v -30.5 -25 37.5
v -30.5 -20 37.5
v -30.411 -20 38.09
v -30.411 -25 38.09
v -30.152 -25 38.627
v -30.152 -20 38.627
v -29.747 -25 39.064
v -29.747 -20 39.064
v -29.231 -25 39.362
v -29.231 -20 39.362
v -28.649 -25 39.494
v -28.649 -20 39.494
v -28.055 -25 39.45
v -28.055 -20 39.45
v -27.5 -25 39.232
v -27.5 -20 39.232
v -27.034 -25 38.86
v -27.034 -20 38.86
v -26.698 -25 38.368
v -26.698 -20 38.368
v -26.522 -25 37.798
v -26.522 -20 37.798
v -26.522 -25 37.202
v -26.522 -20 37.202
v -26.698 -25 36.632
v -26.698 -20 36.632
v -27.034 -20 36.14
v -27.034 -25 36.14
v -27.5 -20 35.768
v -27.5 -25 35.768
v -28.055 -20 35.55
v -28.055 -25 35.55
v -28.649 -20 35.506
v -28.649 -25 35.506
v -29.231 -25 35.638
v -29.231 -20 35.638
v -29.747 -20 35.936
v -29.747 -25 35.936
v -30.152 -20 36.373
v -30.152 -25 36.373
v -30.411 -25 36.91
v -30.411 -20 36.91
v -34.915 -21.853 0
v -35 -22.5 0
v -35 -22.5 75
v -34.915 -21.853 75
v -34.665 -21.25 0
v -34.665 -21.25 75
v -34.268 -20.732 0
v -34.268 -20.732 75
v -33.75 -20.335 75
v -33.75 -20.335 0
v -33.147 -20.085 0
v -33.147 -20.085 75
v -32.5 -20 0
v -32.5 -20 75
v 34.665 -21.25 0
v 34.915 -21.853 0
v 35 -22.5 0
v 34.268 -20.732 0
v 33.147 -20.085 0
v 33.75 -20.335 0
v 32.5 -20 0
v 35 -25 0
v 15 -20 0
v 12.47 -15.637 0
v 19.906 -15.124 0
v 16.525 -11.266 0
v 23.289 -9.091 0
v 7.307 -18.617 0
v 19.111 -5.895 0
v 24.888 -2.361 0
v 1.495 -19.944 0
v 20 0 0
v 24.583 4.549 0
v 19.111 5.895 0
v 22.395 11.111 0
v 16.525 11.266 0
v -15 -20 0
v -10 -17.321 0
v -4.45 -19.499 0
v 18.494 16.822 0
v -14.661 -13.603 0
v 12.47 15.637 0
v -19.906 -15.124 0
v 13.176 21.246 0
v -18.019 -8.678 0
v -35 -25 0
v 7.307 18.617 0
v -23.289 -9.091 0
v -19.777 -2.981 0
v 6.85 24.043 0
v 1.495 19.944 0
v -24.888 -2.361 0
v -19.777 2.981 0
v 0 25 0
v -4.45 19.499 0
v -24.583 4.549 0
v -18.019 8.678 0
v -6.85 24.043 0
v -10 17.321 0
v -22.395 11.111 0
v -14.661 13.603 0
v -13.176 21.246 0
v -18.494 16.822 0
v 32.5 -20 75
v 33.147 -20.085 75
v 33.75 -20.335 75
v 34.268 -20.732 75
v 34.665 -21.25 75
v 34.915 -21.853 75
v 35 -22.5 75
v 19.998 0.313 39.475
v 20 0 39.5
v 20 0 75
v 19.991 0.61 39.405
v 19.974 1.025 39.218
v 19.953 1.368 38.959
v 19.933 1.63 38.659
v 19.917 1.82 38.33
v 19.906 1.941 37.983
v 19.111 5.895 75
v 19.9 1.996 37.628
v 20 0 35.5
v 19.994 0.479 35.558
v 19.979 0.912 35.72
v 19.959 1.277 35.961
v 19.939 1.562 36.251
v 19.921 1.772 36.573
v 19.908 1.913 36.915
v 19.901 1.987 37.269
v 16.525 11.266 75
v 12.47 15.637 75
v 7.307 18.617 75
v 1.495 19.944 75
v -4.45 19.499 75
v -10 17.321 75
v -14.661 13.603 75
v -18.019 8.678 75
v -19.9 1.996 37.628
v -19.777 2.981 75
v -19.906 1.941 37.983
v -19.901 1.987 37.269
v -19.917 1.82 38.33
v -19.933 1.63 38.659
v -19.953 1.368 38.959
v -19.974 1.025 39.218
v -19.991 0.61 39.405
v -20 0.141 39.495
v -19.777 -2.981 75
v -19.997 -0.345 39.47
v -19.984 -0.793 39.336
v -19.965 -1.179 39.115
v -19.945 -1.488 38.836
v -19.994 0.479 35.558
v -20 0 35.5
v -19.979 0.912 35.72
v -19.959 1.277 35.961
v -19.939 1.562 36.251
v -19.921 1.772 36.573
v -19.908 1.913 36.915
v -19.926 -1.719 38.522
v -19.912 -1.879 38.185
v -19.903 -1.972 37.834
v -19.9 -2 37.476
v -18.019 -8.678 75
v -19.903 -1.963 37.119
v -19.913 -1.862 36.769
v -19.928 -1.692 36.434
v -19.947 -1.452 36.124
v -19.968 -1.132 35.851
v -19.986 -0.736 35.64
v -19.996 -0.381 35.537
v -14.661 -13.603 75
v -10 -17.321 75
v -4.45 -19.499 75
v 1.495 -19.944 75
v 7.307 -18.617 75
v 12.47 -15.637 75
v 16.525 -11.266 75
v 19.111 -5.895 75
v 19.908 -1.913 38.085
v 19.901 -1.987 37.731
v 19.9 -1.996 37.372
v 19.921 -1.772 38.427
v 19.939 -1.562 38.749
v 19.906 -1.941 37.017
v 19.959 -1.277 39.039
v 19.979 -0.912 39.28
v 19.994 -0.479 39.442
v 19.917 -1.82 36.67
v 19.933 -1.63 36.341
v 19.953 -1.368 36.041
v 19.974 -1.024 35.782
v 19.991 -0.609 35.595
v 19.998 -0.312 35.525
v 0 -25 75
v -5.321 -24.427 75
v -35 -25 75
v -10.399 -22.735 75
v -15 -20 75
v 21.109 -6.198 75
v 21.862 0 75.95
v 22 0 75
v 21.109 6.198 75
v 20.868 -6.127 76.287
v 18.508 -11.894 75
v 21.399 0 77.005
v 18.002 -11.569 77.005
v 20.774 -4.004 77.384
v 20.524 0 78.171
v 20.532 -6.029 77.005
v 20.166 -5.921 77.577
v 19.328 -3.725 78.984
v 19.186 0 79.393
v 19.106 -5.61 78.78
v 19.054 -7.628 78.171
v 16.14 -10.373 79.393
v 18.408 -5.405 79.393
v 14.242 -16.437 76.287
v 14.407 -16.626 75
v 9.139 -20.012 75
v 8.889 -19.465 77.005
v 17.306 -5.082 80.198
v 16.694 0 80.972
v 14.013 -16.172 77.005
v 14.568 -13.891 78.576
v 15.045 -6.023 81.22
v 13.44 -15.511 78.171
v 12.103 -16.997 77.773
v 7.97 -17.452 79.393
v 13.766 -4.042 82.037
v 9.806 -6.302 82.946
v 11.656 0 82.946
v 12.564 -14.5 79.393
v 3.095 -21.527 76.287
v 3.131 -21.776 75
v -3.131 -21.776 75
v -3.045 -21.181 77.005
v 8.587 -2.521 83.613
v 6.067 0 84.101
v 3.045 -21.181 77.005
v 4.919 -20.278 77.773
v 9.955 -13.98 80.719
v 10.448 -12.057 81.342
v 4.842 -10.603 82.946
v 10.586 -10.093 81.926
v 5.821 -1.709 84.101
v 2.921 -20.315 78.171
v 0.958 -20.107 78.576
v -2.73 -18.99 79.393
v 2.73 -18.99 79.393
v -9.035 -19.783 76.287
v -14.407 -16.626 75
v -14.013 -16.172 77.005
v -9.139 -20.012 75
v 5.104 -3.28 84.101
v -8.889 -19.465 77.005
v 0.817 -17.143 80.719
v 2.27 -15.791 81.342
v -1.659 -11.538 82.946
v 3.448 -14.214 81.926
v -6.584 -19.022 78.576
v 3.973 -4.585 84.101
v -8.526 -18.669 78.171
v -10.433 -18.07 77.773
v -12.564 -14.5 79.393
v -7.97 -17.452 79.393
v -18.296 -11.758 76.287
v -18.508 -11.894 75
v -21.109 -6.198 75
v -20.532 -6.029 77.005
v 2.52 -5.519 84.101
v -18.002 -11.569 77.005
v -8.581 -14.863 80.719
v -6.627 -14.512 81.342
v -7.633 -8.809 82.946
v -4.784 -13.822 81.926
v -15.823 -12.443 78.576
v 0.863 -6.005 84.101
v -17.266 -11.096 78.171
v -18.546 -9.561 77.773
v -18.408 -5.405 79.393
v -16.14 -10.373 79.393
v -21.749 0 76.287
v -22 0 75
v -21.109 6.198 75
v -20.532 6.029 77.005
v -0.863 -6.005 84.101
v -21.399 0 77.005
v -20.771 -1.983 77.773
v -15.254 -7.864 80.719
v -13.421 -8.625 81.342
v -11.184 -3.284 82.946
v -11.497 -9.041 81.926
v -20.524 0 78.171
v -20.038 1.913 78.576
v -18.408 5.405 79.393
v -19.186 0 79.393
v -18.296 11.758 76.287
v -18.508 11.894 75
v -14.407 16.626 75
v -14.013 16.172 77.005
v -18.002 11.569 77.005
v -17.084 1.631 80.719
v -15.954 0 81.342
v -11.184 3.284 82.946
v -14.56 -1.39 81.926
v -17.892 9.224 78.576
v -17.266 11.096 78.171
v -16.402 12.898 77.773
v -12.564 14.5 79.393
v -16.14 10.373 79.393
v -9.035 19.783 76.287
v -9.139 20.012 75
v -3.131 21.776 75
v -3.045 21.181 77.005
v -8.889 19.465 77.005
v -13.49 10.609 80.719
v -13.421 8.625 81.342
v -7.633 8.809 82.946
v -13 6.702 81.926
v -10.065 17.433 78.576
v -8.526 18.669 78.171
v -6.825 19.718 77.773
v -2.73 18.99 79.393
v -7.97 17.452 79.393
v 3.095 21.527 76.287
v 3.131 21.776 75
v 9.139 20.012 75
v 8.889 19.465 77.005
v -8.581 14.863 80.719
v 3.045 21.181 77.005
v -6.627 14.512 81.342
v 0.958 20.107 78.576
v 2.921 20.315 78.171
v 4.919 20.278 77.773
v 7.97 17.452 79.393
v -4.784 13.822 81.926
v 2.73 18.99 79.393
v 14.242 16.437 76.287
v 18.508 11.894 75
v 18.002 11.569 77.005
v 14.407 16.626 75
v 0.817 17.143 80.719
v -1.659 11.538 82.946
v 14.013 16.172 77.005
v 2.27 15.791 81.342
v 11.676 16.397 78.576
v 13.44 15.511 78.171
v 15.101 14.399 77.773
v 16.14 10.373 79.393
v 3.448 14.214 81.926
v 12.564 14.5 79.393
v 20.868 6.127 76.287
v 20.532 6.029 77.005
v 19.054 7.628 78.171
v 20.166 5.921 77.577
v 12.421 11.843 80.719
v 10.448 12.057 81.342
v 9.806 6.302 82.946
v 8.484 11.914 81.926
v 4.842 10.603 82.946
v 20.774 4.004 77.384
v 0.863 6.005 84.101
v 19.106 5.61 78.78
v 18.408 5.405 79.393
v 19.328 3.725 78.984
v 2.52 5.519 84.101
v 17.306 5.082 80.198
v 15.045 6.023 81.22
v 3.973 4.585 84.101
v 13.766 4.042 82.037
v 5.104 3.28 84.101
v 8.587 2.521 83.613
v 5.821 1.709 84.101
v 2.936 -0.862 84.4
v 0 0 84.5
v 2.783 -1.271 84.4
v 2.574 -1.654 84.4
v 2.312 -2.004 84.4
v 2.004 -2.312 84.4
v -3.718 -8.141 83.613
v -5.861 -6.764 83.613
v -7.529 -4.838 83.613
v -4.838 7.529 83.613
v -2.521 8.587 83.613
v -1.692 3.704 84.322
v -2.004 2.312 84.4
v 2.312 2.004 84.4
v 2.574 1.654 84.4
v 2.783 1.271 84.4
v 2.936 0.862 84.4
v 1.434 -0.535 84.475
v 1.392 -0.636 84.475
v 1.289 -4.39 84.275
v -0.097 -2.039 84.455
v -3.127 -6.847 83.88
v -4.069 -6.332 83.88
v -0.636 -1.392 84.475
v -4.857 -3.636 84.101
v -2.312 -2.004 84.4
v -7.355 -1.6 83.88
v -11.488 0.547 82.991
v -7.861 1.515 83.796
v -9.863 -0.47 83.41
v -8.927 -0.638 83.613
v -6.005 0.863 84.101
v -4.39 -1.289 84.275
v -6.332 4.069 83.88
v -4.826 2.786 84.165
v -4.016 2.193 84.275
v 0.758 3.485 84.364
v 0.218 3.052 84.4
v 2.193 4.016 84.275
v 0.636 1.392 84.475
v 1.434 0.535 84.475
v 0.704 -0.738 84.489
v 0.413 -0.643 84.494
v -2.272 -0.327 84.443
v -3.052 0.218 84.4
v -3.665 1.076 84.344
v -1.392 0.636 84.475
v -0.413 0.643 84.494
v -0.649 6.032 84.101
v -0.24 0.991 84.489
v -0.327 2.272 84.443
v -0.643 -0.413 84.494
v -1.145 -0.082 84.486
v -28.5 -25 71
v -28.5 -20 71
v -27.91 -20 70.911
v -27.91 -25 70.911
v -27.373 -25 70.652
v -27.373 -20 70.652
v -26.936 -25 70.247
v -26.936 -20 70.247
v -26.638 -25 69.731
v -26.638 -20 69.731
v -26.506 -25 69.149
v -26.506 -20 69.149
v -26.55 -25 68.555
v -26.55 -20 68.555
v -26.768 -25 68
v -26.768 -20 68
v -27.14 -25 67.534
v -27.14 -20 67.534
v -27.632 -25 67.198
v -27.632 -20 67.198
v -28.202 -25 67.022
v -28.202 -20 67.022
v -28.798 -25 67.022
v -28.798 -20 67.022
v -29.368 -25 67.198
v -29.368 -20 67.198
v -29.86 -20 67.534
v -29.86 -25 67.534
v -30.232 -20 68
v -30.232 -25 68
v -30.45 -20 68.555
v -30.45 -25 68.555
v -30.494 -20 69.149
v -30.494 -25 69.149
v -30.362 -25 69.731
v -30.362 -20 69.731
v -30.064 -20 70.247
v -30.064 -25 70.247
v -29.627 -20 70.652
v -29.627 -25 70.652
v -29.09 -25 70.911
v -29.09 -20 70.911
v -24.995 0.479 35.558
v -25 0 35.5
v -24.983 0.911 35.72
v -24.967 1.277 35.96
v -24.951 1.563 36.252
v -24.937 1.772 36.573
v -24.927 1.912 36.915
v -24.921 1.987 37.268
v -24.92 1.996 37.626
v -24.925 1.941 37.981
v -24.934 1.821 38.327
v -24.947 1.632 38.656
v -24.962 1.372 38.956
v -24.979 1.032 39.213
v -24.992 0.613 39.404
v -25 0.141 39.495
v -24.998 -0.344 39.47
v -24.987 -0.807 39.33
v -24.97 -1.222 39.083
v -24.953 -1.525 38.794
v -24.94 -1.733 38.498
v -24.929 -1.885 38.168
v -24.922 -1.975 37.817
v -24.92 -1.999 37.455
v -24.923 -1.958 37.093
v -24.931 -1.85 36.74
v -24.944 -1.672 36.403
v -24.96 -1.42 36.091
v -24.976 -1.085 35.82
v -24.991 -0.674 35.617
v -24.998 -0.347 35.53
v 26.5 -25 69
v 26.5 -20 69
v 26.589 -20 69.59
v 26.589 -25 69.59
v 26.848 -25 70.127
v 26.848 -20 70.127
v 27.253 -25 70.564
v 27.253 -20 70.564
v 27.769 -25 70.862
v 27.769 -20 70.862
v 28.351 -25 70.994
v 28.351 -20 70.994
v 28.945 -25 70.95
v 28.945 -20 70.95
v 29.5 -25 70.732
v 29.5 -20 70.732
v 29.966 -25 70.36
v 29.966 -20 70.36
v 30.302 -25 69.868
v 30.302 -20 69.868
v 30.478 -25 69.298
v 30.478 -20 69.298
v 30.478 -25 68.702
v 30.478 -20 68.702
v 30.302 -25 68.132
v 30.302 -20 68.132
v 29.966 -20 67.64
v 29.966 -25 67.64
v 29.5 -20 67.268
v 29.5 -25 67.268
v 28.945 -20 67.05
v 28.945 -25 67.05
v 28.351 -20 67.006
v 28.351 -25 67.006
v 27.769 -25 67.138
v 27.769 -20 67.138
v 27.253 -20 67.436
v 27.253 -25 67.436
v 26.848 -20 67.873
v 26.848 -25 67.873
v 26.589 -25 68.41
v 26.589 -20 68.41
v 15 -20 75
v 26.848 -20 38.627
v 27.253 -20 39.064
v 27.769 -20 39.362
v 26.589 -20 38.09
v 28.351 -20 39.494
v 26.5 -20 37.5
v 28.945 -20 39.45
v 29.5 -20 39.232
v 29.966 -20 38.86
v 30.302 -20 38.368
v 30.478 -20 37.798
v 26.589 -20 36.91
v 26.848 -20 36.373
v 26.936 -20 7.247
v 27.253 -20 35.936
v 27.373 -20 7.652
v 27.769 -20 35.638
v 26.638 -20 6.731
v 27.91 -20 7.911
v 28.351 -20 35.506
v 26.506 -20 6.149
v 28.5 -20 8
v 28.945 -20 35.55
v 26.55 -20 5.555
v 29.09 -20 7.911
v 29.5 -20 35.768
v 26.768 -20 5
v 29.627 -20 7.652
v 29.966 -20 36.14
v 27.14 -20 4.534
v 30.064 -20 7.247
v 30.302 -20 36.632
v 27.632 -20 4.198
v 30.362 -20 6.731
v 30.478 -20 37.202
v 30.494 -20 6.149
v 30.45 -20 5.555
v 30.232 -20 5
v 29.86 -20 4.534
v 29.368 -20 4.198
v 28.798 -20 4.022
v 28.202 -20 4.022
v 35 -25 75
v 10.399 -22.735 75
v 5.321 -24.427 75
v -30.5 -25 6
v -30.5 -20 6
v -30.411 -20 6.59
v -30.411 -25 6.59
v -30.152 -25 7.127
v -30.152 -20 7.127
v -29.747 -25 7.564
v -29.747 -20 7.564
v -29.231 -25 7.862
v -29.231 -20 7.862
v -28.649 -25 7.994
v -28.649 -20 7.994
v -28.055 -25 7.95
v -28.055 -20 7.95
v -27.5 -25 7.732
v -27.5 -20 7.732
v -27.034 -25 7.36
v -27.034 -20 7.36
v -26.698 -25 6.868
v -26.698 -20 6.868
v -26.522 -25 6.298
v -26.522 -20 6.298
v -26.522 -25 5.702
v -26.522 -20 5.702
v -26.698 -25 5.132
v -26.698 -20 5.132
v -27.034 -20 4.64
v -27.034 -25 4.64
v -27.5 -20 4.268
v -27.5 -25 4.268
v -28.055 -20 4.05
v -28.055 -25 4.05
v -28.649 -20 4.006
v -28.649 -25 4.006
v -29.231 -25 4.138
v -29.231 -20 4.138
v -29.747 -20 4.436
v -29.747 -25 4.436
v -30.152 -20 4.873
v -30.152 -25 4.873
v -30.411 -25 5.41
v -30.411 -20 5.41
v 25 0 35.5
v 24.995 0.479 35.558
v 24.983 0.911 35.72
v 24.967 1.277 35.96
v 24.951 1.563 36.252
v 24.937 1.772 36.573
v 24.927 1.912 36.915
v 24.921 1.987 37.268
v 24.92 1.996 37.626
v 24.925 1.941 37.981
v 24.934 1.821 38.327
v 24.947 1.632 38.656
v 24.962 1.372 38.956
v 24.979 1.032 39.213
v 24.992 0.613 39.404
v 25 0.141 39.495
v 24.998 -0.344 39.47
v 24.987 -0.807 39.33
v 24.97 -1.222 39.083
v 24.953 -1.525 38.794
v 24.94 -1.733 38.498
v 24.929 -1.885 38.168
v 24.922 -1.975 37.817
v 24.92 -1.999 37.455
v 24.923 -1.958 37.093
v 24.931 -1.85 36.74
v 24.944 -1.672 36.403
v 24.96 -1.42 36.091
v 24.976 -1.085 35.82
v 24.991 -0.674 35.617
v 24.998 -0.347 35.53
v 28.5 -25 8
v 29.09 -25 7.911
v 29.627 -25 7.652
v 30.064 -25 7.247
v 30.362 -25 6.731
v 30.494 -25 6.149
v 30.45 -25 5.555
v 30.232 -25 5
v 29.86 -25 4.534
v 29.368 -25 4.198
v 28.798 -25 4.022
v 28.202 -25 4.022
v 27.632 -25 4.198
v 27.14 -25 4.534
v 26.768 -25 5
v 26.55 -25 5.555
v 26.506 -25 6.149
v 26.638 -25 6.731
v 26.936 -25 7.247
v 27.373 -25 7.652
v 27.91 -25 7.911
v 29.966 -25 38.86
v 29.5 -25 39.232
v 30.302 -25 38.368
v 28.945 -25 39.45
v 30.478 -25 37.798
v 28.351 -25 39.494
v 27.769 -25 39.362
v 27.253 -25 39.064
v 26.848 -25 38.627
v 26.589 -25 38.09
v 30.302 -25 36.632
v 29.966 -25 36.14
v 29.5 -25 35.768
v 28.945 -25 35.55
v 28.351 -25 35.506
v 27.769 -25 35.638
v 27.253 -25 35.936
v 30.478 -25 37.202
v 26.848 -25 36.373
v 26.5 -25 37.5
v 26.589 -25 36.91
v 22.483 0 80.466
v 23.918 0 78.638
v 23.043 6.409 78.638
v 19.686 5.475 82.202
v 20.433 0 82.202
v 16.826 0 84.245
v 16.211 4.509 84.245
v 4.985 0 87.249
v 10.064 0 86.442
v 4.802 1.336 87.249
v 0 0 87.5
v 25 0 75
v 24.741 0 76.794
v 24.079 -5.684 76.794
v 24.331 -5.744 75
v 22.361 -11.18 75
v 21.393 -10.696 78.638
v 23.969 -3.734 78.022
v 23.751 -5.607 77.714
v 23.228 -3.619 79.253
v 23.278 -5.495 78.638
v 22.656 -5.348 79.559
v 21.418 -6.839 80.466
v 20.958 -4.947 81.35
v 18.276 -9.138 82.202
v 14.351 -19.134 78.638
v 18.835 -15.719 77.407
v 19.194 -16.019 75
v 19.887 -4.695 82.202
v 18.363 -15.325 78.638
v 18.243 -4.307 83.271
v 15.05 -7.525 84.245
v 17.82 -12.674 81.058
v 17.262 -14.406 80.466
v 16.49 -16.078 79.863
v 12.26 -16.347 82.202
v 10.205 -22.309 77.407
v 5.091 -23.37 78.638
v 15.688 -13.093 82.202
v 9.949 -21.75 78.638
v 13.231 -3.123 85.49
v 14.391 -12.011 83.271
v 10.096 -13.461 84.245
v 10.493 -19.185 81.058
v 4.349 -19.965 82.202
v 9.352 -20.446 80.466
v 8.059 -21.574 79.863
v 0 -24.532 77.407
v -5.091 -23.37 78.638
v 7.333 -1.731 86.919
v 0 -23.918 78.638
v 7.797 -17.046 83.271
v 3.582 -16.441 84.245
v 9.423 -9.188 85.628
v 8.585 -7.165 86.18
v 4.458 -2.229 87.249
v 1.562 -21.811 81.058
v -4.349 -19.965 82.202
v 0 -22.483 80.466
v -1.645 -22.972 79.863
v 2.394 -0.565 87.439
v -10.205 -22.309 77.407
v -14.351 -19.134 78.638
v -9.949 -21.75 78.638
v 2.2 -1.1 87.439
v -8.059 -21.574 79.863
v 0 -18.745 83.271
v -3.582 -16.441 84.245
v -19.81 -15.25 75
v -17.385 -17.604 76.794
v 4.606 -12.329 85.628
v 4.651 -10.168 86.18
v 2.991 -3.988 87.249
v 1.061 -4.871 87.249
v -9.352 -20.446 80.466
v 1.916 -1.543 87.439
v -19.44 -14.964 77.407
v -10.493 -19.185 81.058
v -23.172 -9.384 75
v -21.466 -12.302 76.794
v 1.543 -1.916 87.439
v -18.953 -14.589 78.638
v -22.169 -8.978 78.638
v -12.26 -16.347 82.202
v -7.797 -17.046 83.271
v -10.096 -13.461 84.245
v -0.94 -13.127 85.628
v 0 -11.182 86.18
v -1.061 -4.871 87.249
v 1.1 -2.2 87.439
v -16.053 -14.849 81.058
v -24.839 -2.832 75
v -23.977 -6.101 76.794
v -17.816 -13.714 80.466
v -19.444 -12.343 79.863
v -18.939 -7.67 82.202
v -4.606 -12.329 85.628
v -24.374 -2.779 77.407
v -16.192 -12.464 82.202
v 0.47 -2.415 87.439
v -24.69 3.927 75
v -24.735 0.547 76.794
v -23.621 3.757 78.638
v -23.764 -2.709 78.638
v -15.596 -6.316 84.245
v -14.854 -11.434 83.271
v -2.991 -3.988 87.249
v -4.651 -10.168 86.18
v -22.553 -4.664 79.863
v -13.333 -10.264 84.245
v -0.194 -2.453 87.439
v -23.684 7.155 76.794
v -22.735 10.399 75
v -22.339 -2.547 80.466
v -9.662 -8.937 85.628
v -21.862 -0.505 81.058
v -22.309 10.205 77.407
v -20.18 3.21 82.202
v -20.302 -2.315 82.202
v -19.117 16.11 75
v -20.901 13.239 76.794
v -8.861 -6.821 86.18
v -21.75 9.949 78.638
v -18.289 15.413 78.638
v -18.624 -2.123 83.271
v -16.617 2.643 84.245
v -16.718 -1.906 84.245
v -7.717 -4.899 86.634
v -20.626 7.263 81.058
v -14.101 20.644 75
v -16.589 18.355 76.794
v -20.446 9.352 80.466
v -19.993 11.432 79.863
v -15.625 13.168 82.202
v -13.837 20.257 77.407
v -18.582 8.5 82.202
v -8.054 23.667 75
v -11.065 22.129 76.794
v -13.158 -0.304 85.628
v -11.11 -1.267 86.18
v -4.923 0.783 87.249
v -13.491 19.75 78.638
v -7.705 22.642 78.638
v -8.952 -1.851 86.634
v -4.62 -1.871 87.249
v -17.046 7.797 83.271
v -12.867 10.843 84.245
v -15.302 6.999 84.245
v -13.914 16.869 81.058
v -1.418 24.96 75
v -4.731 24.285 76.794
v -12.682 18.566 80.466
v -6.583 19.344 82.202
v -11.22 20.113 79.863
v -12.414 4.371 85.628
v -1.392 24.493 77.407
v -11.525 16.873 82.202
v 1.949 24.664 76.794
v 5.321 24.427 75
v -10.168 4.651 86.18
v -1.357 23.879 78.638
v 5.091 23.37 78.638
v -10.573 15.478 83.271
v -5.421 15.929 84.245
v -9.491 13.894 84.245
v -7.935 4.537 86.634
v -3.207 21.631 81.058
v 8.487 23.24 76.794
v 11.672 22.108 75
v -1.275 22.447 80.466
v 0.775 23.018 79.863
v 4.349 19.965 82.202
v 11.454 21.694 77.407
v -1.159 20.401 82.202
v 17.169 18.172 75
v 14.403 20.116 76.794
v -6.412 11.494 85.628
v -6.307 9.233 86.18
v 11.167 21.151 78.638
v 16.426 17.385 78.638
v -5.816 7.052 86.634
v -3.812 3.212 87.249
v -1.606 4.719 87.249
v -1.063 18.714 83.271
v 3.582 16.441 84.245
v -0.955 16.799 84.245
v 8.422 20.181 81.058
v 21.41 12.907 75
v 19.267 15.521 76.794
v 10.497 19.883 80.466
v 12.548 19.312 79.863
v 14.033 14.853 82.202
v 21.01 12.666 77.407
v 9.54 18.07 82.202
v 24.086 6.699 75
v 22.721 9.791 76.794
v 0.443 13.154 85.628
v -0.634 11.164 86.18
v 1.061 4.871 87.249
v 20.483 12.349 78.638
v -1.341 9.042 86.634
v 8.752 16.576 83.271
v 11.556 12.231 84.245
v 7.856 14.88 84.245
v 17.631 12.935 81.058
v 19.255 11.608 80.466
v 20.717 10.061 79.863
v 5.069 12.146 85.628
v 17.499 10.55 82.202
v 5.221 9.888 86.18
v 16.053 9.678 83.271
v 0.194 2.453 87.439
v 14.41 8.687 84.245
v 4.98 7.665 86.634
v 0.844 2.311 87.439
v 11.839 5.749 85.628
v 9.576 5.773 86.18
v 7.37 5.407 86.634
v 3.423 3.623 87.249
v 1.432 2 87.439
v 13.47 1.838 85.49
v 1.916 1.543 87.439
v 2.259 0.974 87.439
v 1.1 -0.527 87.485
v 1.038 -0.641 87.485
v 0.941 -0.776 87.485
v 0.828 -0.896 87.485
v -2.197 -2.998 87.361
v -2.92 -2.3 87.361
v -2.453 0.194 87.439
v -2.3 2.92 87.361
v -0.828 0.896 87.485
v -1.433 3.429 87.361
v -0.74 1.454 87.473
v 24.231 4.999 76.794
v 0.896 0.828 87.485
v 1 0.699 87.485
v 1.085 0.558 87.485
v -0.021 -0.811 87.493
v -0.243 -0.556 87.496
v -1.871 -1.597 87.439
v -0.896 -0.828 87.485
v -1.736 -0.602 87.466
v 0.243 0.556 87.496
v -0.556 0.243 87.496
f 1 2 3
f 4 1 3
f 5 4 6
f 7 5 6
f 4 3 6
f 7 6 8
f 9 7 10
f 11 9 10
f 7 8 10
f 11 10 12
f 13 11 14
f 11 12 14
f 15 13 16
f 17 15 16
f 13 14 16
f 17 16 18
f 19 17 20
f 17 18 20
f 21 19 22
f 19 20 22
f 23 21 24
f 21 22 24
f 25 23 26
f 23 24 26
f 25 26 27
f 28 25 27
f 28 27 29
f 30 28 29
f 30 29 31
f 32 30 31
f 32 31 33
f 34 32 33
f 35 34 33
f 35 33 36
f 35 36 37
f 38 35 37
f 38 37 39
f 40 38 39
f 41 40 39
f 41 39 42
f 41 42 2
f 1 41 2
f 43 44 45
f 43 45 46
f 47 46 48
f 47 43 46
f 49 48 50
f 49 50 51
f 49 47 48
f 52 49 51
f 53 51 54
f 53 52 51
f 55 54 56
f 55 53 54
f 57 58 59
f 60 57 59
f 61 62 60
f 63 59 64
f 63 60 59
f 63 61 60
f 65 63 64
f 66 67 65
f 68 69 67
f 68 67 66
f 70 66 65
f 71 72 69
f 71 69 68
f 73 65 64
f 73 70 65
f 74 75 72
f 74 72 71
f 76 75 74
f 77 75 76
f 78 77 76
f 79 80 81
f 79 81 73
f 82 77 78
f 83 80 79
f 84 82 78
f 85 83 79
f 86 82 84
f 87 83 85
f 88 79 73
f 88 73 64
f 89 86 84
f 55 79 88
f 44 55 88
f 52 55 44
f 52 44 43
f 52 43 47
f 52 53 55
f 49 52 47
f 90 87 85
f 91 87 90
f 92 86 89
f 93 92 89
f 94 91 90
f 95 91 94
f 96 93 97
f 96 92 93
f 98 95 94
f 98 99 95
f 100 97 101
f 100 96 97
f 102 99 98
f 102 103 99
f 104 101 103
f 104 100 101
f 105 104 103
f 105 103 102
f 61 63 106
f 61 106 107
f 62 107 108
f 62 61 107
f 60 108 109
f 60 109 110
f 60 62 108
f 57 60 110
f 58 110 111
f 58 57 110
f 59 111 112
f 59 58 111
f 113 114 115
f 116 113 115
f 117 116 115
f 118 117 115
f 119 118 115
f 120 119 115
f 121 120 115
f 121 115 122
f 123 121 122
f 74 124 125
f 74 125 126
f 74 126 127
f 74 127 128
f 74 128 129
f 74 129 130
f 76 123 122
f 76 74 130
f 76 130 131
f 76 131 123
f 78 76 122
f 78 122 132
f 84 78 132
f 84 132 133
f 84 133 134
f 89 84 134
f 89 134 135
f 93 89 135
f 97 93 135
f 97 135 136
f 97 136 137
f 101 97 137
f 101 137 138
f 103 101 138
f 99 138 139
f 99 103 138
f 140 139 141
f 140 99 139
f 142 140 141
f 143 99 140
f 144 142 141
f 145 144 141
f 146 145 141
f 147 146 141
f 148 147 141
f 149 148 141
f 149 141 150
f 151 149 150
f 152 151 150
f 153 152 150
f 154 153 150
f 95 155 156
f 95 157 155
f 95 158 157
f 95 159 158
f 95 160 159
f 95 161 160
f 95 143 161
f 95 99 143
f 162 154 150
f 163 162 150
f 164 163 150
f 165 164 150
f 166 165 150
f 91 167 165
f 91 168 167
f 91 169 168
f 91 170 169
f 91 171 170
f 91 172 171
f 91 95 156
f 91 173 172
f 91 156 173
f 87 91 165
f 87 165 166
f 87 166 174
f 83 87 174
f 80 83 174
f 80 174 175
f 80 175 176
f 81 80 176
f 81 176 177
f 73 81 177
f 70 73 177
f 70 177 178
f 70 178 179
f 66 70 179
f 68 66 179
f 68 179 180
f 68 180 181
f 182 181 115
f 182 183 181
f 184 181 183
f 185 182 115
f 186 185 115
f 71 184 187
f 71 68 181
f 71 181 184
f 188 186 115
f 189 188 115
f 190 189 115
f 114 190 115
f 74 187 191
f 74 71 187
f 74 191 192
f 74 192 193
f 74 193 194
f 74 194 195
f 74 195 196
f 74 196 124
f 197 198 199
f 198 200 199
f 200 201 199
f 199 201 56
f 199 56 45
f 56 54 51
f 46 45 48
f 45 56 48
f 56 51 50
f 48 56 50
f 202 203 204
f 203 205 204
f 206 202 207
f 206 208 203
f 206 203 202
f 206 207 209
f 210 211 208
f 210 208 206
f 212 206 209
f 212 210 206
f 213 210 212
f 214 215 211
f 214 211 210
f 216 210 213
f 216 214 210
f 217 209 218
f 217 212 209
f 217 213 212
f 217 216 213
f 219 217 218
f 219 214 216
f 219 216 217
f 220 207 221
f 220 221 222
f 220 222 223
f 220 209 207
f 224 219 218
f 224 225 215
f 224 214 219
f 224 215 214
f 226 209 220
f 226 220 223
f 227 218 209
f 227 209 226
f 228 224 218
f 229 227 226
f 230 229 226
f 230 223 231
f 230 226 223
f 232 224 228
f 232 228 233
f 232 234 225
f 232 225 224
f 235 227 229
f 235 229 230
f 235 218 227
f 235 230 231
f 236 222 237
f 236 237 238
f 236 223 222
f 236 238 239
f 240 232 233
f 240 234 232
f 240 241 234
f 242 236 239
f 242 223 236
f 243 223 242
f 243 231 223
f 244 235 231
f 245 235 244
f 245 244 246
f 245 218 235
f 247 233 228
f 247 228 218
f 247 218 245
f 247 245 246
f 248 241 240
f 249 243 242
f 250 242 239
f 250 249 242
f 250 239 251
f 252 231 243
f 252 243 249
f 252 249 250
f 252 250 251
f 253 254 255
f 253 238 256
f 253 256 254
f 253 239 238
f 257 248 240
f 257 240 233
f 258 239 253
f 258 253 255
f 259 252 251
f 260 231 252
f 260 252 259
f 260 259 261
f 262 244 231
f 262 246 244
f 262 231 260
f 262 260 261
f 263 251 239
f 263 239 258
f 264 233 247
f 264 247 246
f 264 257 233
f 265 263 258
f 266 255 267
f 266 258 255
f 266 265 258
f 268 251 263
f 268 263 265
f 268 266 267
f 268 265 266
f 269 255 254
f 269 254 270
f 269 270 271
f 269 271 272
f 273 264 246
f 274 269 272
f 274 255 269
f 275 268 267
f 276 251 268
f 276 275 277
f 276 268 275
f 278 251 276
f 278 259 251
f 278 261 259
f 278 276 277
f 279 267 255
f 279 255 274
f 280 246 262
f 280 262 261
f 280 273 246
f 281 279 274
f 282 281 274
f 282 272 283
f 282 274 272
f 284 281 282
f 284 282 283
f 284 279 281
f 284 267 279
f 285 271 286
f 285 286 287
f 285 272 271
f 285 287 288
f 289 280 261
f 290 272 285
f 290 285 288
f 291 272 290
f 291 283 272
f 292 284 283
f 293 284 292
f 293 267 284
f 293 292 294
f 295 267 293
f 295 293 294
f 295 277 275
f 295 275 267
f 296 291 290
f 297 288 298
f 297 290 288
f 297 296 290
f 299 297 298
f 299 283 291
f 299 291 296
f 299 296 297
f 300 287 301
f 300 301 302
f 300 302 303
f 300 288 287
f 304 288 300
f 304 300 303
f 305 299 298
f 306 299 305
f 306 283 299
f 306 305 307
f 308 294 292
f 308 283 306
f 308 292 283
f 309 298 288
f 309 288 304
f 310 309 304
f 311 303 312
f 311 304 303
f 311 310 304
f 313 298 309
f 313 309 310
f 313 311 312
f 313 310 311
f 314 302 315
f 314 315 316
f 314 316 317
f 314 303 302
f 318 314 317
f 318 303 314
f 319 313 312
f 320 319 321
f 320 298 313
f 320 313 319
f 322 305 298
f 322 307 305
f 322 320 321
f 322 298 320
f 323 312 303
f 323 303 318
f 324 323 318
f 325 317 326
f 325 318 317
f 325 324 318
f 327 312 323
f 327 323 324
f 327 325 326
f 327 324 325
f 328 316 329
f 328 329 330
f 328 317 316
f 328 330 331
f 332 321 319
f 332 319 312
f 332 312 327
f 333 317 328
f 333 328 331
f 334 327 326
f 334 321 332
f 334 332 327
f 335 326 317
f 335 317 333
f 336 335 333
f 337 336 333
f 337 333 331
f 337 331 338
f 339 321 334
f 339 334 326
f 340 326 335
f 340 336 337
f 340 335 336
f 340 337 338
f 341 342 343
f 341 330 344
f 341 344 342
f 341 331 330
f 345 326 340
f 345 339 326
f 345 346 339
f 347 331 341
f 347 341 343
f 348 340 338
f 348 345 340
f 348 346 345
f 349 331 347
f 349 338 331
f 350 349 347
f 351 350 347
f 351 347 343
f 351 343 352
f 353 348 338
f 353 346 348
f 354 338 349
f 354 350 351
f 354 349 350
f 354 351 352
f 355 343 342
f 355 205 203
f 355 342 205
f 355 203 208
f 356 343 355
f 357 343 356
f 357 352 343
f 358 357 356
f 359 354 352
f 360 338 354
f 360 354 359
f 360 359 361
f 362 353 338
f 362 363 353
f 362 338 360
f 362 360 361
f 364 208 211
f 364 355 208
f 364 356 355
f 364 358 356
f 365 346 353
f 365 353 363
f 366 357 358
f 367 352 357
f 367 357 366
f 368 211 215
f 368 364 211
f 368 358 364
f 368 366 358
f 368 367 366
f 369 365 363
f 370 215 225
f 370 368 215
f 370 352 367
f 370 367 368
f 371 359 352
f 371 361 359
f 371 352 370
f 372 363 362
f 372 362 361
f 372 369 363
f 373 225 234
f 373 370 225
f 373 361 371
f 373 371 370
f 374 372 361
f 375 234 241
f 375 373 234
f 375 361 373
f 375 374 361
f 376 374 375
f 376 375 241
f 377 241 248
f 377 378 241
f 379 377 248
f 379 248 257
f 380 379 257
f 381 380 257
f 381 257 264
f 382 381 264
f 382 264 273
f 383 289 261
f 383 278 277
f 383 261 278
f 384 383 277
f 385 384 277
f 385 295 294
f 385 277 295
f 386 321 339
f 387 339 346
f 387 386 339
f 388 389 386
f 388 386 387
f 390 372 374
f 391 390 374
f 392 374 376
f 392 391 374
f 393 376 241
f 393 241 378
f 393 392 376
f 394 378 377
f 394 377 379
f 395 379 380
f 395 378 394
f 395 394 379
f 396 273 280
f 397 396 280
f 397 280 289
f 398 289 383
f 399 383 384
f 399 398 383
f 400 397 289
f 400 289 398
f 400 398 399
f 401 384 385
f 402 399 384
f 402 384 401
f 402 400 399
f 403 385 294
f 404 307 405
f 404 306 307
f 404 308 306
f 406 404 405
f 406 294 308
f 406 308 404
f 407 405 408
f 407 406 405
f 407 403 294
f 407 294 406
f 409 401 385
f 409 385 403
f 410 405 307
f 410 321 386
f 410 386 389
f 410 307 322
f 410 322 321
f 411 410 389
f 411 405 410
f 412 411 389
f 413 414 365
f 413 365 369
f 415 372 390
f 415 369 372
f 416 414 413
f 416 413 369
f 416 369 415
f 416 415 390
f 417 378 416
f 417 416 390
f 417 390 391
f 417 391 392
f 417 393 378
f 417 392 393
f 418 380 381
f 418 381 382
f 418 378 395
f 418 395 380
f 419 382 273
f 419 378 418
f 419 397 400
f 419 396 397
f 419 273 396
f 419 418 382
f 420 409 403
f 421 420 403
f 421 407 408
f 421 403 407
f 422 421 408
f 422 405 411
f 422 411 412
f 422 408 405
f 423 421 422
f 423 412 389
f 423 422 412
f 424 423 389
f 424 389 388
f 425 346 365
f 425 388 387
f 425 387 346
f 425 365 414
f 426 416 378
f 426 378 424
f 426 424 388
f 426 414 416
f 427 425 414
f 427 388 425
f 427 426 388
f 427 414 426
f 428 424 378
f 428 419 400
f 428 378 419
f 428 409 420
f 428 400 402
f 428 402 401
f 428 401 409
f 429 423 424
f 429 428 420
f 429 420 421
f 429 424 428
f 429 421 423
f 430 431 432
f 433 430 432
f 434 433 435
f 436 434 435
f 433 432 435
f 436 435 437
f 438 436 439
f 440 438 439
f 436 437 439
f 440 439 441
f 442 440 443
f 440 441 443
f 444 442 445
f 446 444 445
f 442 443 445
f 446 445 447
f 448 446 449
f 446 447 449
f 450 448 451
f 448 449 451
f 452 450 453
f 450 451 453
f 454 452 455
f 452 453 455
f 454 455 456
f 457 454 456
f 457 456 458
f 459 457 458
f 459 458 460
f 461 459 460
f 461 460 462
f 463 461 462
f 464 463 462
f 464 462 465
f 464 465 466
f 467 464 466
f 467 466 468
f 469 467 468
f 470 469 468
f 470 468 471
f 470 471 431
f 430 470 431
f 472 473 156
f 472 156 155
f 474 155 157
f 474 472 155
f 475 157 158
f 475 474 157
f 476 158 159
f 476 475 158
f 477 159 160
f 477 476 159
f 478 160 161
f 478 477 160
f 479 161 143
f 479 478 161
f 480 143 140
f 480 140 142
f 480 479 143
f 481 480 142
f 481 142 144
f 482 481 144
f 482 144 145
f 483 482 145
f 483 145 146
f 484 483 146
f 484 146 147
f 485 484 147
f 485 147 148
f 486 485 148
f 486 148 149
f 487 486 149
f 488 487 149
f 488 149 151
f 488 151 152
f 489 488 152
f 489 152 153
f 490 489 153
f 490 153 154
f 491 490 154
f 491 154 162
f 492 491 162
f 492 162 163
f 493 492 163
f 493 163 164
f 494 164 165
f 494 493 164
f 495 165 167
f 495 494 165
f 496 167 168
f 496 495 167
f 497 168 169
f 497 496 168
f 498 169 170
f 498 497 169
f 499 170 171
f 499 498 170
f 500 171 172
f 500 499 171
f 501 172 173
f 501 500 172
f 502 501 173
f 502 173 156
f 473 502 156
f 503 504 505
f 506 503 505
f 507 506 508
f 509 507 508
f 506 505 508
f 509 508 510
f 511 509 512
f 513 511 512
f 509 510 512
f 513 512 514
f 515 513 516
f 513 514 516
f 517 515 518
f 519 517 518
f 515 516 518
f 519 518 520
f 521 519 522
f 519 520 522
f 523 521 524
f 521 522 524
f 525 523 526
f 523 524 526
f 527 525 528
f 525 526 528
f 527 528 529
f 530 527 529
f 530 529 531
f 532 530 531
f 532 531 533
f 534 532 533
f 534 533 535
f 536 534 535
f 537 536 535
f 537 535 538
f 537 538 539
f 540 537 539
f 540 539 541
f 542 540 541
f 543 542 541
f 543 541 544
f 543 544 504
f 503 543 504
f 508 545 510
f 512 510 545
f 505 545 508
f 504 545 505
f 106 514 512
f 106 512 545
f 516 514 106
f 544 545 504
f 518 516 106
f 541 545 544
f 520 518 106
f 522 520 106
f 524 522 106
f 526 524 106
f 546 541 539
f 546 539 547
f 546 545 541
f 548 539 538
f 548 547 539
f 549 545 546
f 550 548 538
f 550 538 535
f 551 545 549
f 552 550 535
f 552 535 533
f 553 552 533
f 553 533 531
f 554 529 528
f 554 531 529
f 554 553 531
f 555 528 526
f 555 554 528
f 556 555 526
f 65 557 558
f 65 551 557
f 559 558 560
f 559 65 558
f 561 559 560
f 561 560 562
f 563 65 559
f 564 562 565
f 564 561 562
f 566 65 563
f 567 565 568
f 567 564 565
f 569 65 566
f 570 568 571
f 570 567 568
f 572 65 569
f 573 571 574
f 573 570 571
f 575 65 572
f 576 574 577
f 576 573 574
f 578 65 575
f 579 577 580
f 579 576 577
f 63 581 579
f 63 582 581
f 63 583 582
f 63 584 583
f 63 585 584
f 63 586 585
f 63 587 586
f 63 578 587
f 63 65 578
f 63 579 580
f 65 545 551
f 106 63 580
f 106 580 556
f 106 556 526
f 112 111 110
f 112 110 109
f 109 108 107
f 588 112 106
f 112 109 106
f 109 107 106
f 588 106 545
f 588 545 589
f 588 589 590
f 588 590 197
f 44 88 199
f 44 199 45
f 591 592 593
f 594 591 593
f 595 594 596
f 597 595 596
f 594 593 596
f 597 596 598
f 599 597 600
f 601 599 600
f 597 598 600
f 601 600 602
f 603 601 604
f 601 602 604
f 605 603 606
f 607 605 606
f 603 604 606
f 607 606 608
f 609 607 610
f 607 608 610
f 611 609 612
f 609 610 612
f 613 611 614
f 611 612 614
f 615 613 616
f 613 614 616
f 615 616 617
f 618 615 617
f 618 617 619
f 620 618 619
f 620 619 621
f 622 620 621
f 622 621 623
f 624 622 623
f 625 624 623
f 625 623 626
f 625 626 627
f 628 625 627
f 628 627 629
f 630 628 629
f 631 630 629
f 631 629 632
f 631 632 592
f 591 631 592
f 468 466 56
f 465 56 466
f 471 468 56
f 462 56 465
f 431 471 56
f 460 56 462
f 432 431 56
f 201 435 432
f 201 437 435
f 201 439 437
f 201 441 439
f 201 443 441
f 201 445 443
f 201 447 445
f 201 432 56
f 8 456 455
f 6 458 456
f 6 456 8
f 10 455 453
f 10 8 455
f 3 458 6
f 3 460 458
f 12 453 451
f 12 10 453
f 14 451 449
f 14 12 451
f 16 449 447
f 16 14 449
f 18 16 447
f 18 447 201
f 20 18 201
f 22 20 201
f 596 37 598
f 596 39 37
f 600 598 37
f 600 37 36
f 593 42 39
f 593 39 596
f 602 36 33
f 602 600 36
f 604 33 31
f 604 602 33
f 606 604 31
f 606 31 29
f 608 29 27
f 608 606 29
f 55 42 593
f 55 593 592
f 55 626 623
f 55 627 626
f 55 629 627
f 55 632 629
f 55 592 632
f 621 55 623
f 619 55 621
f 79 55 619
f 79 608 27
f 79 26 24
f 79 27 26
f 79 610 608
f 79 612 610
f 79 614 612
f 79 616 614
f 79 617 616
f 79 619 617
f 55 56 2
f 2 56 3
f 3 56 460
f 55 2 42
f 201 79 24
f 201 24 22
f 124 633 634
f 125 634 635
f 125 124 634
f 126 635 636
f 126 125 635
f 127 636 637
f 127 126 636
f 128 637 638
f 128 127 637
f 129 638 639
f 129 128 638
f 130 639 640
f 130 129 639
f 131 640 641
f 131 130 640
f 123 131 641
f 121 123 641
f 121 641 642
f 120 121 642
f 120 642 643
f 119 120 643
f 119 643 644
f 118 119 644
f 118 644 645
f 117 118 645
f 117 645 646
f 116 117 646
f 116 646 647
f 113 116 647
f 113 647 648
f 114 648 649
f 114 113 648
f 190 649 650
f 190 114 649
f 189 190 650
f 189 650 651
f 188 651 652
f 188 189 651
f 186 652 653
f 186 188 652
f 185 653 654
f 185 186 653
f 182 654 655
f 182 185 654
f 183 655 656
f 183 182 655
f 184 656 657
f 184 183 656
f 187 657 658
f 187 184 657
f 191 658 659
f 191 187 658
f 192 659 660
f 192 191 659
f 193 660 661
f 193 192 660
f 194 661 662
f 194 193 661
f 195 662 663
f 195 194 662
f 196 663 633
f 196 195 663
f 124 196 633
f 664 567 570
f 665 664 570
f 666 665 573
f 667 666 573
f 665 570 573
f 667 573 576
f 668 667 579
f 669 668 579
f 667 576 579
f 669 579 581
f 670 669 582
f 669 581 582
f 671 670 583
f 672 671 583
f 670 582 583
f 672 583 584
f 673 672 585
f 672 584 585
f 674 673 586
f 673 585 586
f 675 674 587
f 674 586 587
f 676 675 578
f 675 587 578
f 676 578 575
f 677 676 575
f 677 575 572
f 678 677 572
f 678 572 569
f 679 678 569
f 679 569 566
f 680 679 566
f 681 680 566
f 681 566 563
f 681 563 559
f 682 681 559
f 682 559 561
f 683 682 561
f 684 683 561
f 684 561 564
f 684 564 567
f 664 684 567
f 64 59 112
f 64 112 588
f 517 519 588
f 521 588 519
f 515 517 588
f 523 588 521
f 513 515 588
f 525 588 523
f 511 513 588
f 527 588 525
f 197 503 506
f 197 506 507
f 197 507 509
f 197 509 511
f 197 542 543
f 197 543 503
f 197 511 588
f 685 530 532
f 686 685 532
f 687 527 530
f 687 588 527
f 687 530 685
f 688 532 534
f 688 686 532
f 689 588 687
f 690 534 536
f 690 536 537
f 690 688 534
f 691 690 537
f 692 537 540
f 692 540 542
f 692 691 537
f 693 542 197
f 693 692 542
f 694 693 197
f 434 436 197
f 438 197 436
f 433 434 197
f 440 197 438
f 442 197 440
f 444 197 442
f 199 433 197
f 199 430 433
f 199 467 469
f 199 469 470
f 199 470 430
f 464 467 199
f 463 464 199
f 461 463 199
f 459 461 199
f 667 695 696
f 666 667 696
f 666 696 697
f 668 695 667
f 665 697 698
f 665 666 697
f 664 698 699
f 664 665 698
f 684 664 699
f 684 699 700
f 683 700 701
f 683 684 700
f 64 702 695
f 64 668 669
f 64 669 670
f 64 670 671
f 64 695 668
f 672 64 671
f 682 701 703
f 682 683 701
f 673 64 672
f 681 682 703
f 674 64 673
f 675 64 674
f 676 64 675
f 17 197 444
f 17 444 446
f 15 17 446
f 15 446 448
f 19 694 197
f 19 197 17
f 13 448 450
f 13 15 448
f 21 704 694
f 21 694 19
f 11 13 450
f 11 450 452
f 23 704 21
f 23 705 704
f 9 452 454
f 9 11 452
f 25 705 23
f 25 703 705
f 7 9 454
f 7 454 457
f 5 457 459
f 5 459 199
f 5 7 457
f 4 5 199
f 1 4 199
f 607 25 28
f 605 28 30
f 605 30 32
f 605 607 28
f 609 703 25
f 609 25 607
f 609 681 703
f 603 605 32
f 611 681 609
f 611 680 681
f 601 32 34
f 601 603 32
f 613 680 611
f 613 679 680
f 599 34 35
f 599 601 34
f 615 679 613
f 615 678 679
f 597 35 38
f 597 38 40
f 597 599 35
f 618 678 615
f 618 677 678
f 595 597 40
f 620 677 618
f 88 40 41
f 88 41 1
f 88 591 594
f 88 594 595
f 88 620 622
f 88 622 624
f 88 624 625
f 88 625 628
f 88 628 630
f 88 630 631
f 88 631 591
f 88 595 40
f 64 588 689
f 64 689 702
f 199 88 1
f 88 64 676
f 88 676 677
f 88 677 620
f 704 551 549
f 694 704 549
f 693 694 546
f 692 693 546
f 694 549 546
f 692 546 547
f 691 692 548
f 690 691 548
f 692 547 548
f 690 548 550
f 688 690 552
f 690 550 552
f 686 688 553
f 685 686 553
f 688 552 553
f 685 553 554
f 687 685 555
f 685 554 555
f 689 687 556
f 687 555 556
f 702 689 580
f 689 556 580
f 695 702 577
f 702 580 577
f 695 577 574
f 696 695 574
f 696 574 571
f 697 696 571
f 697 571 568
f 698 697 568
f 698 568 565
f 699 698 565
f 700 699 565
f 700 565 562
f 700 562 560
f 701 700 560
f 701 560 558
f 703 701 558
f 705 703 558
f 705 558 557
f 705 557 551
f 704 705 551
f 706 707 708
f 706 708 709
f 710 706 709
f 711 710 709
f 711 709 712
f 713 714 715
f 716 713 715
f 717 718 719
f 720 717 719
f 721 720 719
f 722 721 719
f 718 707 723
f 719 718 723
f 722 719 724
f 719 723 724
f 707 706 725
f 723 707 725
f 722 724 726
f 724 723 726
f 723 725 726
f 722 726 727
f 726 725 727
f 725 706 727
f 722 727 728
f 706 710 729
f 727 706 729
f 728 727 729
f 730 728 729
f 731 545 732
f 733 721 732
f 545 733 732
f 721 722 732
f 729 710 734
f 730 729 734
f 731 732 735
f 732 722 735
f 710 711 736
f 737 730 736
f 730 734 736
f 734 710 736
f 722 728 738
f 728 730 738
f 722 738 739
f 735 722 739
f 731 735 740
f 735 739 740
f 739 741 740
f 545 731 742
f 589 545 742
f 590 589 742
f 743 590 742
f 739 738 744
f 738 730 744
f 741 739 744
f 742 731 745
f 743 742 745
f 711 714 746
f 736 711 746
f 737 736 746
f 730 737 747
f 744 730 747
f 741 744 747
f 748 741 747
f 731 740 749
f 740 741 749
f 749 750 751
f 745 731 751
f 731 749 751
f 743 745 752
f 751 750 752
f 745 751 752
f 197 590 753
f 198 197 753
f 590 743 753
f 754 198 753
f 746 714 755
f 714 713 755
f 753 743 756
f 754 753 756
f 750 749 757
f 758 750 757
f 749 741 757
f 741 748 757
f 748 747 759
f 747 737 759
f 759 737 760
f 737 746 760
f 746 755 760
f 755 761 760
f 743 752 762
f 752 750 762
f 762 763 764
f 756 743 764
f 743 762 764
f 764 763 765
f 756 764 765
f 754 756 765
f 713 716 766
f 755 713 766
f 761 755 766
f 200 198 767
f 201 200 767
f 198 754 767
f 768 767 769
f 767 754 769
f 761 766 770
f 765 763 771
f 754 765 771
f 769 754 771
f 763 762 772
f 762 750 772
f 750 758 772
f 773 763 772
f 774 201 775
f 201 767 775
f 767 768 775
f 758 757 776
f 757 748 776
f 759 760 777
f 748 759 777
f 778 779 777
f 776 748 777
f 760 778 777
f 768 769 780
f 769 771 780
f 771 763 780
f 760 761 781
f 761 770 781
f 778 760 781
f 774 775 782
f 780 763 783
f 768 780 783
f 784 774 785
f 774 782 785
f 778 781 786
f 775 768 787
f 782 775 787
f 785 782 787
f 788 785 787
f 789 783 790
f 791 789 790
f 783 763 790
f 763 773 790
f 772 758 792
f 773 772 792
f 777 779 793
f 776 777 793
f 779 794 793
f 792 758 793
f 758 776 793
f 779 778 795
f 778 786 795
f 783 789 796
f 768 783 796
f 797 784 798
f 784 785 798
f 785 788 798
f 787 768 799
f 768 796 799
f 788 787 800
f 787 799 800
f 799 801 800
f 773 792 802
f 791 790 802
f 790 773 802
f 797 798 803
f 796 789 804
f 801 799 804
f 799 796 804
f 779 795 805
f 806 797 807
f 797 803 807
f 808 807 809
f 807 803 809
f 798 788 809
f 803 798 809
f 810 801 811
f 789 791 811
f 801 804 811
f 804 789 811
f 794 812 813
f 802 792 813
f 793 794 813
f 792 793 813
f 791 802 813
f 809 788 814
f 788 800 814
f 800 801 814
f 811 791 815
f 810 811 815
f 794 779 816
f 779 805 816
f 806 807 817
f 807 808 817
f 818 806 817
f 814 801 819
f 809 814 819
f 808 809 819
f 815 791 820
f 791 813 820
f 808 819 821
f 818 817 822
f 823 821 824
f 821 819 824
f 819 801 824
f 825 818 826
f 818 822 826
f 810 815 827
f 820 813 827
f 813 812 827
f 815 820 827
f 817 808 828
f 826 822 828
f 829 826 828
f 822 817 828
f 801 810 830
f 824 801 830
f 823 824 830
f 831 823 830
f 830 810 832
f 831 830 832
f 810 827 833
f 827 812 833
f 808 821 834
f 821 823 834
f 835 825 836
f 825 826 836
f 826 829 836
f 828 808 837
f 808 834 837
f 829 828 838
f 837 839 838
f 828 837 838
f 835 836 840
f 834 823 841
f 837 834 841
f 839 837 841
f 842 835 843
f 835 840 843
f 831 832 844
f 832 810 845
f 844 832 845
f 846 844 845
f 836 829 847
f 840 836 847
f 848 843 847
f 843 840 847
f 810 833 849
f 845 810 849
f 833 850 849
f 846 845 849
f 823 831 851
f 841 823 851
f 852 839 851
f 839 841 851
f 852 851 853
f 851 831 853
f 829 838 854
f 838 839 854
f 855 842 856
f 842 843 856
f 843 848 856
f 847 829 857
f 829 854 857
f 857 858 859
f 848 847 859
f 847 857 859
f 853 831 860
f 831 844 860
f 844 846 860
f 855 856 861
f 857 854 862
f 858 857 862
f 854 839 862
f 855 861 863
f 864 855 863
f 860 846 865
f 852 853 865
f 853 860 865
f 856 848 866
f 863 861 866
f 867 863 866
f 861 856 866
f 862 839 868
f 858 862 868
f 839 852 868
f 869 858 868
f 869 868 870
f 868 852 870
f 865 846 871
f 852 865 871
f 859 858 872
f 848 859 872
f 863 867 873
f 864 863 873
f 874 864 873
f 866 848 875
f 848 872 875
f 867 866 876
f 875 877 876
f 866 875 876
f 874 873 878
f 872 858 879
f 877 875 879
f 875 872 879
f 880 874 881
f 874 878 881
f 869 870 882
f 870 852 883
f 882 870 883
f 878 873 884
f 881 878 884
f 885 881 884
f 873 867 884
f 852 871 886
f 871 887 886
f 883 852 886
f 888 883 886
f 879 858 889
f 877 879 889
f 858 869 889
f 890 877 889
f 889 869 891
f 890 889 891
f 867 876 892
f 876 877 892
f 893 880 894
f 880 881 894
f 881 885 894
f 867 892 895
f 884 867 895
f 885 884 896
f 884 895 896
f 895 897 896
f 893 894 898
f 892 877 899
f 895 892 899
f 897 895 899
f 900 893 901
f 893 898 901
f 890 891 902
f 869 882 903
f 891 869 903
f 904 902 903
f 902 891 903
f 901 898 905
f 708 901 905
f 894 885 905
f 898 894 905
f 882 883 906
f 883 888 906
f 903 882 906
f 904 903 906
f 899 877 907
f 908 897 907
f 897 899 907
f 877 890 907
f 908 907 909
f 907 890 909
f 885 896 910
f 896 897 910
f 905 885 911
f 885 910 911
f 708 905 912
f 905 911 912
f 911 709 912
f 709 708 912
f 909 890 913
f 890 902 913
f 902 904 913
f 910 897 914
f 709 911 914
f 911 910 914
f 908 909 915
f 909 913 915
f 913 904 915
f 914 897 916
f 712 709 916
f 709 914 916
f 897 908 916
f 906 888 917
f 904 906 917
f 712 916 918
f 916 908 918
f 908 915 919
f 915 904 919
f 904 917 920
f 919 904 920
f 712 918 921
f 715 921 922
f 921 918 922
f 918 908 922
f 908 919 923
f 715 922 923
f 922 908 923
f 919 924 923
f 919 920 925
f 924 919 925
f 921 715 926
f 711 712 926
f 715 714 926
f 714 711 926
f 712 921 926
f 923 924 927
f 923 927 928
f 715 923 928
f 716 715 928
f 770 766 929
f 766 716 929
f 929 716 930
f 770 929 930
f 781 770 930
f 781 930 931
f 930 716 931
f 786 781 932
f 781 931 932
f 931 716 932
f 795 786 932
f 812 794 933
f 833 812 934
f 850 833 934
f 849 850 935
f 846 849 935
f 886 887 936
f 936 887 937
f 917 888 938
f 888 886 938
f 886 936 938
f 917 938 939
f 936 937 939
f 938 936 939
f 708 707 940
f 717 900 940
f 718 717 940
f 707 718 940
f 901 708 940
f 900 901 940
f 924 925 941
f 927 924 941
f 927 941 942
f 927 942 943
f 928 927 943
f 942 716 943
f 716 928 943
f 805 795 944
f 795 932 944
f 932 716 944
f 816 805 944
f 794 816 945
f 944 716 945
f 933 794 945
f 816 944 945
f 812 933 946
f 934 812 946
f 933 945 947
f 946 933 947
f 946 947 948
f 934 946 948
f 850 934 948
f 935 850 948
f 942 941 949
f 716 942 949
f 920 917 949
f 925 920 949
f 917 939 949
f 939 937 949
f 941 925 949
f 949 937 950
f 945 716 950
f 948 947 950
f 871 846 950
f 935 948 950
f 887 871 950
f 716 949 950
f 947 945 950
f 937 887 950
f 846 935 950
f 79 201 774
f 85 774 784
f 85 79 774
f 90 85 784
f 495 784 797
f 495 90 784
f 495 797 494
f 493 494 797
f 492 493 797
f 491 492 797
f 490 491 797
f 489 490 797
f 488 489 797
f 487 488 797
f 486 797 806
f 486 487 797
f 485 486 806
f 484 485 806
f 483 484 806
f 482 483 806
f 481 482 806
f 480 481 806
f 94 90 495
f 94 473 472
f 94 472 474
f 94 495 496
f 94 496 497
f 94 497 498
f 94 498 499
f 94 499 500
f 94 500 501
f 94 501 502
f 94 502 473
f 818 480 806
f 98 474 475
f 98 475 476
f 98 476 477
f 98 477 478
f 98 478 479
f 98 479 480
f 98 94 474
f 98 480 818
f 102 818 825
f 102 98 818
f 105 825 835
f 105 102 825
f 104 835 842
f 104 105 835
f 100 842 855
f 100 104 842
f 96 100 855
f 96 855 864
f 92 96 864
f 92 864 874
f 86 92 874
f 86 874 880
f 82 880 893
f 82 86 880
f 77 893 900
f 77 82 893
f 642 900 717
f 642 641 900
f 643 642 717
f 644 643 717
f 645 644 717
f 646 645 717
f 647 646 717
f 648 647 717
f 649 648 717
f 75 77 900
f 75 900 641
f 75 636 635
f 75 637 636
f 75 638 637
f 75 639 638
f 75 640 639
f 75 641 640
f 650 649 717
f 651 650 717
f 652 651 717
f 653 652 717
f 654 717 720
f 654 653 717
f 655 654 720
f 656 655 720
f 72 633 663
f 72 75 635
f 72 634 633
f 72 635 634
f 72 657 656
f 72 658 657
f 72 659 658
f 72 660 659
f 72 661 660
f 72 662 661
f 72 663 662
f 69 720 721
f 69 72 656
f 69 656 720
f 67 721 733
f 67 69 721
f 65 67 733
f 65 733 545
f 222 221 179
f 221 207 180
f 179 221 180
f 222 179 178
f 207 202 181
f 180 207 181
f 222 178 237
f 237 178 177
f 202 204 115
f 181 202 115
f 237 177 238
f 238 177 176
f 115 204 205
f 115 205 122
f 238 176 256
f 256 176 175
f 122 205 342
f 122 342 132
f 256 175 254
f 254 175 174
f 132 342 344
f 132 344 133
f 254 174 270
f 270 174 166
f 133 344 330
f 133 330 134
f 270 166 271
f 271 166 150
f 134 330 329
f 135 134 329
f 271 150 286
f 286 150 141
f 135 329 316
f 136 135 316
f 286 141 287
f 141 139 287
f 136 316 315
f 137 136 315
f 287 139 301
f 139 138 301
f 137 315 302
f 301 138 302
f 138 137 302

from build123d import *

# Parameters (mm, degrees)
SKETCH1_R               = 20
BOSS_EXTRUDE1_DEPTH     = 75
CUT_EXTRUDE2_DEPTH      = 87.458082329
CUT_EXTRUDE2_DEPTH_BACK = 87.458082329
SKETCH3_R               = 2
SKETCH2_R               = 2
CUT_EXTRUDE3_DEPTH      = 10
SKETCH2_4_R             = 2
CUT_EXTRUDE4_DEPTH      = 10


with BuildPart() as part:
    # Sketch1 → Boss-Extrude1 (new body)
    with BuildSketch(Plane.XY):
        with BuildLine():
            Line((-32.5, -20), (-15, -20))
            ThreePointArc((-15, -20), (0, 25), (15, -20))
            Line((15, -20), (32.5, -20))
            ThreePointArc((32.5, -20), (34.267766953, -20.732233047), (35, -22.5))
            Line((35, -22.5), (35, -25))
            Line((35, -25), (-35, -25))
            Line((-35, -25), (-35, -22.5))
            ThreePointArc((-35, -22.5), (-34.267766953, -20.732233047), (-32.5, -20))
        make_face()
        Circle(SKETCH1_R, mode=Mode.SUBTRACT)
    extrude(amount=BOSS_EXTRUDE1_DEPTH)

    # Sketch3 → Cut-Extrude2 (cut, two sides: drawn at the far end of the back side and taken through both)
    with BuildSketch(Plane(origin=(0, 0, 0), x_dir=(0, 0, -1), z_dir=(1, 0, 0)).offset(-CUT_EXTRUDE2_DEPTH_BACK)):
        with Locations((-37.5, 0)):
            Circle(SKETCH3_R)
    extrude(amount=CUT_EXTRUDE2_DEPTH + CUT_EXTRUDE2_DEPTH_BACK, mode=Mode.SUBTRACT)

    # Sketch4 → Revolve1 (revolve)
    with BuildSketch(Plane(origin=(0, 0, 0), x_dir=(0, 0, -1), z_dir=(1, 0, 0))):
        with BuildLine():
            Line((-87.5, 0), (-84.5, 0))
            add(Edge.make_bspline(
                [(-75, 22), (-75.216185099, 22), (-75.636923923, 21.95894914), (-76.546271577, 21.69469962), (-77.844229013, 20.93469698), (-79.554525777, 19.135071068), (-81.193703824, 16.461120363), (-82.603978079, 13.036619939), (-83.678181323, 9.024220506), (-84.34830956, 4.618558705), (-84.5, 1.528633227), (-84.5, 0)],
                knots=[0, 0, 0, 0, 0.09817477, 0.196349541, 0.392699082, 0.589048623, 0.785398163, 0.981747704, 1.178097245, 1.374446786, 1.570796327, 1.570796327, 1.570796327, 1.570796327], degree=3))
            Line((-75, 22), (-75, 25))
            add(Edge.make_bspline(
                [(-75, 25), (-87.5, 25), (-87.5, 0)],
                knots=[0, 0, 0, 1.570796327, 1.570796327, 1.570796327], degree=2, weights=[1, 0.707106781, 1]))
        make_face()
    revolve(axis=Axis((0, 0, 87.5), (0, 0, -1)))

    # Sketch2 → Cut-Extrude3 (cut)
    with BuildSketch(Plane(origin=(0, -20, 0), x_dir=(1, 0, 0), z_dir=(0, 1, 0))):
        with Locations((28.5, -69)):
            Circle(SKETCH2_R)
    extrude(amount=-CUT_EXTRUDE3_DEPTH, mode=Mode.SUBTRACT)

    # Sketch2<4> → Cut-Extrude4 (cut)
    with BuildSketch(Plane(origin=(0, -20, 0), x_dir=(1, 0, 0), z_dir=(0, 1, 0))):
        with Locations((-28.5, -6)):
            Circle(SKETCH2_4_R)
        with Locations((28.5, -6)):
            Circle(SKETCH2_4_R)
        with Locations((-28.5, -69)):
            Circle(SKETCH2_4_R)
        with Locations((28.5, -37.5)):
            Circle(SKETCH2_4_R)
        with Locations((-28.5, -37.5)):
            Circle(SKETCH2_4_R)
    extrude(amount=-CUT_EXTRUDE4_DEPTH, mode=Mode.SUBTRACT)


solid = part.part
